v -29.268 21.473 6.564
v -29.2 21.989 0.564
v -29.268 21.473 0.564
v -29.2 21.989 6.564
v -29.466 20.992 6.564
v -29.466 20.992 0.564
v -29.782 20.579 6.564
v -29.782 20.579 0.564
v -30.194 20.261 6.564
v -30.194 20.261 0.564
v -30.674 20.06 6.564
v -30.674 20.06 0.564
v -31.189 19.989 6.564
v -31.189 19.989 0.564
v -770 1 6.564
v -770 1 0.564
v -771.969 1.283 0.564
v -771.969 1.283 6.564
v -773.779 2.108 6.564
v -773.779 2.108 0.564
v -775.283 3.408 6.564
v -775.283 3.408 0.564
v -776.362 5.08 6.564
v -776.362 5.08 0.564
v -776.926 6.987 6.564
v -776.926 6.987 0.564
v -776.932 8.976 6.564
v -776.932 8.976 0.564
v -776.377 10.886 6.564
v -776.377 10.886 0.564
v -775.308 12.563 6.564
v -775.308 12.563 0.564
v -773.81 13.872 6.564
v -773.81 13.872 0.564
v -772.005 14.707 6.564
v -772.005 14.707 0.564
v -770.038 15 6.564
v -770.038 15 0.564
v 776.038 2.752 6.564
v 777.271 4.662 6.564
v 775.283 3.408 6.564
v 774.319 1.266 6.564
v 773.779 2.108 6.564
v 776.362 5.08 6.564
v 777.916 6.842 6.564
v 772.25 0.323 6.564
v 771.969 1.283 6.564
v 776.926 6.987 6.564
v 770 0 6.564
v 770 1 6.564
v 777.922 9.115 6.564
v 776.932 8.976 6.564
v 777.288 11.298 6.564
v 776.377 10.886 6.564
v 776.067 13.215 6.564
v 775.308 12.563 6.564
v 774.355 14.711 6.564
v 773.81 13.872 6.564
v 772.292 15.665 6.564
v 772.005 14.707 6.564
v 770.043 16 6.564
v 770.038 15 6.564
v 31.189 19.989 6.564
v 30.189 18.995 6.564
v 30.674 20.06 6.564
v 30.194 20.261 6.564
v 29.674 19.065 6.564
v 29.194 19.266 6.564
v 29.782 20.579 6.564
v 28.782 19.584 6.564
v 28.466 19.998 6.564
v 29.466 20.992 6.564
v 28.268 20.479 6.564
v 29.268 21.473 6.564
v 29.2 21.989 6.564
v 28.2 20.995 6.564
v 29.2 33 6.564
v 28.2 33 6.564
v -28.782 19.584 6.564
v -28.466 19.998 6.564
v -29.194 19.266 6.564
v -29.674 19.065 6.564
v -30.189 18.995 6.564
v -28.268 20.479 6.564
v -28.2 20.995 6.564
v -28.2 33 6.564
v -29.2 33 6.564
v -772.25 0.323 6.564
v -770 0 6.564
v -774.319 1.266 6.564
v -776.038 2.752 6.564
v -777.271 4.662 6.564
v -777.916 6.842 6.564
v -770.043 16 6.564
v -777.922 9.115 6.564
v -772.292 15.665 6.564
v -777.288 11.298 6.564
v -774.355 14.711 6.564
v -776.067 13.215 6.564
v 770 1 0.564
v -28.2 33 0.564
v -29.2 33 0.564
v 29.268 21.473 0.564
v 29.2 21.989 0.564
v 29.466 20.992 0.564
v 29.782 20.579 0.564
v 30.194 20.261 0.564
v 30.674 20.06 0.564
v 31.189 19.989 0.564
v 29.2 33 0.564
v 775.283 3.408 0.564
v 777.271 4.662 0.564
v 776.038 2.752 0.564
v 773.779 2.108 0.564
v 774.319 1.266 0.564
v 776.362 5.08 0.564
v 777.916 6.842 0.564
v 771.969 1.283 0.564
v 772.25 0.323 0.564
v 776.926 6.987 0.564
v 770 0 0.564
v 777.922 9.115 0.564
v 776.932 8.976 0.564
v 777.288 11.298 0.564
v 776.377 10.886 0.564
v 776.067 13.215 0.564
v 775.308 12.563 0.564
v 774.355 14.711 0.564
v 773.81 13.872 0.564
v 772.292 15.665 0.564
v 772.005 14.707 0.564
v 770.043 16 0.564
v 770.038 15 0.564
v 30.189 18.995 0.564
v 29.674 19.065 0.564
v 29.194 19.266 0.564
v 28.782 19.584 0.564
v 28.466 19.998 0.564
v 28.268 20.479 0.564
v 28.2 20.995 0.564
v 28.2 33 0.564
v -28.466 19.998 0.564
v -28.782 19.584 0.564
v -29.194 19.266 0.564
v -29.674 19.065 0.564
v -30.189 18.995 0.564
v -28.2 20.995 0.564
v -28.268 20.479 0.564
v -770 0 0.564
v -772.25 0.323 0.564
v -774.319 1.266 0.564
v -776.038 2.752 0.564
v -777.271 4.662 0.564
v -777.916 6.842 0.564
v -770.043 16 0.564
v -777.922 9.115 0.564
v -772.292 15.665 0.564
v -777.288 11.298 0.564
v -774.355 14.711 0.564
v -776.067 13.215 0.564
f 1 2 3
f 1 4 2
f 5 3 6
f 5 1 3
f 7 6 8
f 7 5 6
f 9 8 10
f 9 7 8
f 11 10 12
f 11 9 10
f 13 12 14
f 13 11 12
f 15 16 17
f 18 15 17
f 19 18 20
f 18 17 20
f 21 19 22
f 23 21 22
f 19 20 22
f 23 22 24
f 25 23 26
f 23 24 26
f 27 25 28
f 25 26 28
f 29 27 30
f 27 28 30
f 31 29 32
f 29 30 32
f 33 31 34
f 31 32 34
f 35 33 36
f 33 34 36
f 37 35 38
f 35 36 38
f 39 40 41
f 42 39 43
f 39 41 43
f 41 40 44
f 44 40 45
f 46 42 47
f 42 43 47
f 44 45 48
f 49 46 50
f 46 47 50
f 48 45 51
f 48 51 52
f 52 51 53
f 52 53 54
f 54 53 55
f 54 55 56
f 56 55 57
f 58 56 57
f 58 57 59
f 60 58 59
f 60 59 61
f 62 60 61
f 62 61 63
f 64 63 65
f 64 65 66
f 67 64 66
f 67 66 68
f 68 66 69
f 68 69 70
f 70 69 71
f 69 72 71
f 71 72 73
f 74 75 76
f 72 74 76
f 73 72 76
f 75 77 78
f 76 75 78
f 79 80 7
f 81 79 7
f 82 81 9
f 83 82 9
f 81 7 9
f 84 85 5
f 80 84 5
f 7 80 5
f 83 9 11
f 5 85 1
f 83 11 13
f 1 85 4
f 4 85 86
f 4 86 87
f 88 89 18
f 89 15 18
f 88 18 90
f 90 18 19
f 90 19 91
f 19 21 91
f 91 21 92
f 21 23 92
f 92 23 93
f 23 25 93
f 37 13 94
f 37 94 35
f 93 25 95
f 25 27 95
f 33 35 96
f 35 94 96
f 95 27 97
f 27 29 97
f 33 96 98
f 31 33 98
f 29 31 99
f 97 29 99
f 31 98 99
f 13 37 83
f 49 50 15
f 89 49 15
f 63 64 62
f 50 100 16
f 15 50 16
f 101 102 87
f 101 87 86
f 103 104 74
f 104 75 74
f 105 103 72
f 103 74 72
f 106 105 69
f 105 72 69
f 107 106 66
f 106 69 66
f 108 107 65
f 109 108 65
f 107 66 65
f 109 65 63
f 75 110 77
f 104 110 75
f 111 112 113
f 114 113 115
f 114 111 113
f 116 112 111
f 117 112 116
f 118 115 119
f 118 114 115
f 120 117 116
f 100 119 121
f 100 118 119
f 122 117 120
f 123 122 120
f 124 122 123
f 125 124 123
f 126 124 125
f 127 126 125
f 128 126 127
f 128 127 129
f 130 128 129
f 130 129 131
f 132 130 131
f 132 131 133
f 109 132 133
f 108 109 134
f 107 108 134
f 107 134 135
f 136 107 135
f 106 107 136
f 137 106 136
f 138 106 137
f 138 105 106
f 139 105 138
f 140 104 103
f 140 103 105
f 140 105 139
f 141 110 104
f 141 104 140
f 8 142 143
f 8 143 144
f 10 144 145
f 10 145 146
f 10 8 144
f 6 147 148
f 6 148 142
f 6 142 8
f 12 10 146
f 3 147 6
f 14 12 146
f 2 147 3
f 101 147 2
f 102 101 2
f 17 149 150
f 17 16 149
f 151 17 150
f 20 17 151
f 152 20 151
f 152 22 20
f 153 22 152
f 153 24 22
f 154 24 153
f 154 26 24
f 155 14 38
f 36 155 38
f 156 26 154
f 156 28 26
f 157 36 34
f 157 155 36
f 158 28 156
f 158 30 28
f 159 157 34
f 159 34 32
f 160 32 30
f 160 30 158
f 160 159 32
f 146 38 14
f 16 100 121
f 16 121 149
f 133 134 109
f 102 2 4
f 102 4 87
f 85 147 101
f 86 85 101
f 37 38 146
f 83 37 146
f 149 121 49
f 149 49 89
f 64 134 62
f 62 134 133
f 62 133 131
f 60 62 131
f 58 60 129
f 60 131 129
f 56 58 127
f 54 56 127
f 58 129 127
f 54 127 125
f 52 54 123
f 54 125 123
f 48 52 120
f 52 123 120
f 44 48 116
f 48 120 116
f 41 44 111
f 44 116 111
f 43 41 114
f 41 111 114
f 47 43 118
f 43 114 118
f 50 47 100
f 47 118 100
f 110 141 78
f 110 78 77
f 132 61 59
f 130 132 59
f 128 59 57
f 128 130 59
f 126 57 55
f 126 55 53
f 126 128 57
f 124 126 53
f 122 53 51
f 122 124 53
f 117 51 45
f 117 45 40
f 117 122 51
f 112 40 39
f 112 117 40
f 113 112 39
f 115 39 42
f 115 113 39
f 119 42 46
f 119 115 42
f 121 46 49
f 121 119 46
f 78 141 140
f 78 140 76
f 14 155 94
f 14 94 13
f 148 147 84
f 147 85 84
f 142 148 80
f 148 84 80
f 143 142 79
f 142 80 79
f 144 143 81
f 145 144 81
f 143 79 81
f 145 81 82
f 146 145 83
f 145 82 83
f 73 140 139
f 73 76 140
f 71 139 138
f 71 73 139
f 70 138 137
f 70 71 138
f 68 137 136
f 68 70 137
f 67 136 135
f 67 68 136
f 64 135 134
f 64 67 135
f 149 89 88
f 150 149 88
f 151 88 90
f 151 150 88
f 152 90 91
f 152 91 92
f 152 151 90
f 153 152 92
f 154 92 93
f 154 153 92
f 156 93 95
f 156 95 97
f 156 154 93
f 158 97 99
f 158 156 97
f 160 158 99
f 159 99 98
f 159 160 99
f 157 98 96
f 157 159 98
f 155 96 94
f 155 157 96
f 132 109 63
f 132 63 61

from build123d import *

# Parameters (mm, degrees)
BOSS_EXTRUDE1_DEPTH = 6
CUT_EXTRUDE1_DEPTH  = 779.722672073
FILLET1_R           = 2
SKETCH4_W           = 56.4
SKETCH4_H           = 6
CUT_EXTRUDE4_DEPTH  = 1


with BuildPart() as part:
    # Sketch1 → Boss-Extrude1 (new body)
    with BuildSketch(Plane(origin=(0, 0, 0.563566935), x_dir=(-1, 0, 0), z_dir=(0, 0, -1))):
        with BuildLine():
            Line((29.2, 33), (-29.2, 33))
            Line((-29.2, 33), (-29.2, 20))
            Line((-29.2, 20), (-770.043194655, 15.999883388))
            ThreePointArc((-770.043194655, 15.999883388), (-777.999970847, 7.978402594), (-770, 0))
            Line((-770, 0), (770, 0))
            ThreePointArc((770, 0), (777.999970847, 7.978402594), (770.043194655, 15.999883388))
            Line((770.043194655, 15.999883388), (29.2, 20))
            Line((29.2, 20), (29.2, 33))
        make_face()
    extrude(amount=-BOSS_EXTRUDE1_DEPTH)

    # Sketch2 → Cut-Extrude1 (cut, through all)
    with BuildSketch(Plane(origin=(0, 0, 0.563566935), x_dir=(-1, 0, 0), z_dir=(0, 0, -1))):
        with BuildLine():
            Line((28.2, 19.005384834), (28.2, 32))
            Line((28.2, 32), (-28.2, 32))
            Line((-28.2, 32), (-28.2, 19.005384834))
            Line((-28.2, 19.005384834), (-770.037795323, 14.999897965))
            ThreePointArc((-770.037795323, 14.999897965), (-776.999974491, 7.981102269), (-770, 1))
            Line((-770, 1), (770, 1))
            ThreePointArc((770, 1), (776.999974491, 7.981102269), (770.037795323, 14.999897965))
            Line((770.037795323, 14.999897965), (28.2, 19.005384834))
        make_face()
    extrude(amount=-CUT_EXTRUDE1_DEPTH, mode=Mode.SUBTRACT)

    # Fillet1
    fillet1_edges = [part.edges().sort_by_distance(p)[0] for p in [
        (-29.2, 20, 3.563566935),
        (29.2, 20, 3.563566935),
        (-28.2, 19.005384834, 3.563566935),
        (28.2, 19.005384834, 3.563566935),
    ]]
    fillet(fillet1_edges, radius=FILLET1_R)

    # Sketch4 → Cut-Extrude4 (cut)
    with BuildSketch(Plane(origin=(0, 33, 0), x_dir=(-1, 0, 0), z_dir=(0, 1, 0))):
        with Locations((0, 3.563566935)):
            Rectangle(SKETCH4_W, SKETCH4_H)
    extrude(amount=-CUT_EXTRUDE4_DEPTH, mode=Mode.SUBTRACT)


solid = part.part
